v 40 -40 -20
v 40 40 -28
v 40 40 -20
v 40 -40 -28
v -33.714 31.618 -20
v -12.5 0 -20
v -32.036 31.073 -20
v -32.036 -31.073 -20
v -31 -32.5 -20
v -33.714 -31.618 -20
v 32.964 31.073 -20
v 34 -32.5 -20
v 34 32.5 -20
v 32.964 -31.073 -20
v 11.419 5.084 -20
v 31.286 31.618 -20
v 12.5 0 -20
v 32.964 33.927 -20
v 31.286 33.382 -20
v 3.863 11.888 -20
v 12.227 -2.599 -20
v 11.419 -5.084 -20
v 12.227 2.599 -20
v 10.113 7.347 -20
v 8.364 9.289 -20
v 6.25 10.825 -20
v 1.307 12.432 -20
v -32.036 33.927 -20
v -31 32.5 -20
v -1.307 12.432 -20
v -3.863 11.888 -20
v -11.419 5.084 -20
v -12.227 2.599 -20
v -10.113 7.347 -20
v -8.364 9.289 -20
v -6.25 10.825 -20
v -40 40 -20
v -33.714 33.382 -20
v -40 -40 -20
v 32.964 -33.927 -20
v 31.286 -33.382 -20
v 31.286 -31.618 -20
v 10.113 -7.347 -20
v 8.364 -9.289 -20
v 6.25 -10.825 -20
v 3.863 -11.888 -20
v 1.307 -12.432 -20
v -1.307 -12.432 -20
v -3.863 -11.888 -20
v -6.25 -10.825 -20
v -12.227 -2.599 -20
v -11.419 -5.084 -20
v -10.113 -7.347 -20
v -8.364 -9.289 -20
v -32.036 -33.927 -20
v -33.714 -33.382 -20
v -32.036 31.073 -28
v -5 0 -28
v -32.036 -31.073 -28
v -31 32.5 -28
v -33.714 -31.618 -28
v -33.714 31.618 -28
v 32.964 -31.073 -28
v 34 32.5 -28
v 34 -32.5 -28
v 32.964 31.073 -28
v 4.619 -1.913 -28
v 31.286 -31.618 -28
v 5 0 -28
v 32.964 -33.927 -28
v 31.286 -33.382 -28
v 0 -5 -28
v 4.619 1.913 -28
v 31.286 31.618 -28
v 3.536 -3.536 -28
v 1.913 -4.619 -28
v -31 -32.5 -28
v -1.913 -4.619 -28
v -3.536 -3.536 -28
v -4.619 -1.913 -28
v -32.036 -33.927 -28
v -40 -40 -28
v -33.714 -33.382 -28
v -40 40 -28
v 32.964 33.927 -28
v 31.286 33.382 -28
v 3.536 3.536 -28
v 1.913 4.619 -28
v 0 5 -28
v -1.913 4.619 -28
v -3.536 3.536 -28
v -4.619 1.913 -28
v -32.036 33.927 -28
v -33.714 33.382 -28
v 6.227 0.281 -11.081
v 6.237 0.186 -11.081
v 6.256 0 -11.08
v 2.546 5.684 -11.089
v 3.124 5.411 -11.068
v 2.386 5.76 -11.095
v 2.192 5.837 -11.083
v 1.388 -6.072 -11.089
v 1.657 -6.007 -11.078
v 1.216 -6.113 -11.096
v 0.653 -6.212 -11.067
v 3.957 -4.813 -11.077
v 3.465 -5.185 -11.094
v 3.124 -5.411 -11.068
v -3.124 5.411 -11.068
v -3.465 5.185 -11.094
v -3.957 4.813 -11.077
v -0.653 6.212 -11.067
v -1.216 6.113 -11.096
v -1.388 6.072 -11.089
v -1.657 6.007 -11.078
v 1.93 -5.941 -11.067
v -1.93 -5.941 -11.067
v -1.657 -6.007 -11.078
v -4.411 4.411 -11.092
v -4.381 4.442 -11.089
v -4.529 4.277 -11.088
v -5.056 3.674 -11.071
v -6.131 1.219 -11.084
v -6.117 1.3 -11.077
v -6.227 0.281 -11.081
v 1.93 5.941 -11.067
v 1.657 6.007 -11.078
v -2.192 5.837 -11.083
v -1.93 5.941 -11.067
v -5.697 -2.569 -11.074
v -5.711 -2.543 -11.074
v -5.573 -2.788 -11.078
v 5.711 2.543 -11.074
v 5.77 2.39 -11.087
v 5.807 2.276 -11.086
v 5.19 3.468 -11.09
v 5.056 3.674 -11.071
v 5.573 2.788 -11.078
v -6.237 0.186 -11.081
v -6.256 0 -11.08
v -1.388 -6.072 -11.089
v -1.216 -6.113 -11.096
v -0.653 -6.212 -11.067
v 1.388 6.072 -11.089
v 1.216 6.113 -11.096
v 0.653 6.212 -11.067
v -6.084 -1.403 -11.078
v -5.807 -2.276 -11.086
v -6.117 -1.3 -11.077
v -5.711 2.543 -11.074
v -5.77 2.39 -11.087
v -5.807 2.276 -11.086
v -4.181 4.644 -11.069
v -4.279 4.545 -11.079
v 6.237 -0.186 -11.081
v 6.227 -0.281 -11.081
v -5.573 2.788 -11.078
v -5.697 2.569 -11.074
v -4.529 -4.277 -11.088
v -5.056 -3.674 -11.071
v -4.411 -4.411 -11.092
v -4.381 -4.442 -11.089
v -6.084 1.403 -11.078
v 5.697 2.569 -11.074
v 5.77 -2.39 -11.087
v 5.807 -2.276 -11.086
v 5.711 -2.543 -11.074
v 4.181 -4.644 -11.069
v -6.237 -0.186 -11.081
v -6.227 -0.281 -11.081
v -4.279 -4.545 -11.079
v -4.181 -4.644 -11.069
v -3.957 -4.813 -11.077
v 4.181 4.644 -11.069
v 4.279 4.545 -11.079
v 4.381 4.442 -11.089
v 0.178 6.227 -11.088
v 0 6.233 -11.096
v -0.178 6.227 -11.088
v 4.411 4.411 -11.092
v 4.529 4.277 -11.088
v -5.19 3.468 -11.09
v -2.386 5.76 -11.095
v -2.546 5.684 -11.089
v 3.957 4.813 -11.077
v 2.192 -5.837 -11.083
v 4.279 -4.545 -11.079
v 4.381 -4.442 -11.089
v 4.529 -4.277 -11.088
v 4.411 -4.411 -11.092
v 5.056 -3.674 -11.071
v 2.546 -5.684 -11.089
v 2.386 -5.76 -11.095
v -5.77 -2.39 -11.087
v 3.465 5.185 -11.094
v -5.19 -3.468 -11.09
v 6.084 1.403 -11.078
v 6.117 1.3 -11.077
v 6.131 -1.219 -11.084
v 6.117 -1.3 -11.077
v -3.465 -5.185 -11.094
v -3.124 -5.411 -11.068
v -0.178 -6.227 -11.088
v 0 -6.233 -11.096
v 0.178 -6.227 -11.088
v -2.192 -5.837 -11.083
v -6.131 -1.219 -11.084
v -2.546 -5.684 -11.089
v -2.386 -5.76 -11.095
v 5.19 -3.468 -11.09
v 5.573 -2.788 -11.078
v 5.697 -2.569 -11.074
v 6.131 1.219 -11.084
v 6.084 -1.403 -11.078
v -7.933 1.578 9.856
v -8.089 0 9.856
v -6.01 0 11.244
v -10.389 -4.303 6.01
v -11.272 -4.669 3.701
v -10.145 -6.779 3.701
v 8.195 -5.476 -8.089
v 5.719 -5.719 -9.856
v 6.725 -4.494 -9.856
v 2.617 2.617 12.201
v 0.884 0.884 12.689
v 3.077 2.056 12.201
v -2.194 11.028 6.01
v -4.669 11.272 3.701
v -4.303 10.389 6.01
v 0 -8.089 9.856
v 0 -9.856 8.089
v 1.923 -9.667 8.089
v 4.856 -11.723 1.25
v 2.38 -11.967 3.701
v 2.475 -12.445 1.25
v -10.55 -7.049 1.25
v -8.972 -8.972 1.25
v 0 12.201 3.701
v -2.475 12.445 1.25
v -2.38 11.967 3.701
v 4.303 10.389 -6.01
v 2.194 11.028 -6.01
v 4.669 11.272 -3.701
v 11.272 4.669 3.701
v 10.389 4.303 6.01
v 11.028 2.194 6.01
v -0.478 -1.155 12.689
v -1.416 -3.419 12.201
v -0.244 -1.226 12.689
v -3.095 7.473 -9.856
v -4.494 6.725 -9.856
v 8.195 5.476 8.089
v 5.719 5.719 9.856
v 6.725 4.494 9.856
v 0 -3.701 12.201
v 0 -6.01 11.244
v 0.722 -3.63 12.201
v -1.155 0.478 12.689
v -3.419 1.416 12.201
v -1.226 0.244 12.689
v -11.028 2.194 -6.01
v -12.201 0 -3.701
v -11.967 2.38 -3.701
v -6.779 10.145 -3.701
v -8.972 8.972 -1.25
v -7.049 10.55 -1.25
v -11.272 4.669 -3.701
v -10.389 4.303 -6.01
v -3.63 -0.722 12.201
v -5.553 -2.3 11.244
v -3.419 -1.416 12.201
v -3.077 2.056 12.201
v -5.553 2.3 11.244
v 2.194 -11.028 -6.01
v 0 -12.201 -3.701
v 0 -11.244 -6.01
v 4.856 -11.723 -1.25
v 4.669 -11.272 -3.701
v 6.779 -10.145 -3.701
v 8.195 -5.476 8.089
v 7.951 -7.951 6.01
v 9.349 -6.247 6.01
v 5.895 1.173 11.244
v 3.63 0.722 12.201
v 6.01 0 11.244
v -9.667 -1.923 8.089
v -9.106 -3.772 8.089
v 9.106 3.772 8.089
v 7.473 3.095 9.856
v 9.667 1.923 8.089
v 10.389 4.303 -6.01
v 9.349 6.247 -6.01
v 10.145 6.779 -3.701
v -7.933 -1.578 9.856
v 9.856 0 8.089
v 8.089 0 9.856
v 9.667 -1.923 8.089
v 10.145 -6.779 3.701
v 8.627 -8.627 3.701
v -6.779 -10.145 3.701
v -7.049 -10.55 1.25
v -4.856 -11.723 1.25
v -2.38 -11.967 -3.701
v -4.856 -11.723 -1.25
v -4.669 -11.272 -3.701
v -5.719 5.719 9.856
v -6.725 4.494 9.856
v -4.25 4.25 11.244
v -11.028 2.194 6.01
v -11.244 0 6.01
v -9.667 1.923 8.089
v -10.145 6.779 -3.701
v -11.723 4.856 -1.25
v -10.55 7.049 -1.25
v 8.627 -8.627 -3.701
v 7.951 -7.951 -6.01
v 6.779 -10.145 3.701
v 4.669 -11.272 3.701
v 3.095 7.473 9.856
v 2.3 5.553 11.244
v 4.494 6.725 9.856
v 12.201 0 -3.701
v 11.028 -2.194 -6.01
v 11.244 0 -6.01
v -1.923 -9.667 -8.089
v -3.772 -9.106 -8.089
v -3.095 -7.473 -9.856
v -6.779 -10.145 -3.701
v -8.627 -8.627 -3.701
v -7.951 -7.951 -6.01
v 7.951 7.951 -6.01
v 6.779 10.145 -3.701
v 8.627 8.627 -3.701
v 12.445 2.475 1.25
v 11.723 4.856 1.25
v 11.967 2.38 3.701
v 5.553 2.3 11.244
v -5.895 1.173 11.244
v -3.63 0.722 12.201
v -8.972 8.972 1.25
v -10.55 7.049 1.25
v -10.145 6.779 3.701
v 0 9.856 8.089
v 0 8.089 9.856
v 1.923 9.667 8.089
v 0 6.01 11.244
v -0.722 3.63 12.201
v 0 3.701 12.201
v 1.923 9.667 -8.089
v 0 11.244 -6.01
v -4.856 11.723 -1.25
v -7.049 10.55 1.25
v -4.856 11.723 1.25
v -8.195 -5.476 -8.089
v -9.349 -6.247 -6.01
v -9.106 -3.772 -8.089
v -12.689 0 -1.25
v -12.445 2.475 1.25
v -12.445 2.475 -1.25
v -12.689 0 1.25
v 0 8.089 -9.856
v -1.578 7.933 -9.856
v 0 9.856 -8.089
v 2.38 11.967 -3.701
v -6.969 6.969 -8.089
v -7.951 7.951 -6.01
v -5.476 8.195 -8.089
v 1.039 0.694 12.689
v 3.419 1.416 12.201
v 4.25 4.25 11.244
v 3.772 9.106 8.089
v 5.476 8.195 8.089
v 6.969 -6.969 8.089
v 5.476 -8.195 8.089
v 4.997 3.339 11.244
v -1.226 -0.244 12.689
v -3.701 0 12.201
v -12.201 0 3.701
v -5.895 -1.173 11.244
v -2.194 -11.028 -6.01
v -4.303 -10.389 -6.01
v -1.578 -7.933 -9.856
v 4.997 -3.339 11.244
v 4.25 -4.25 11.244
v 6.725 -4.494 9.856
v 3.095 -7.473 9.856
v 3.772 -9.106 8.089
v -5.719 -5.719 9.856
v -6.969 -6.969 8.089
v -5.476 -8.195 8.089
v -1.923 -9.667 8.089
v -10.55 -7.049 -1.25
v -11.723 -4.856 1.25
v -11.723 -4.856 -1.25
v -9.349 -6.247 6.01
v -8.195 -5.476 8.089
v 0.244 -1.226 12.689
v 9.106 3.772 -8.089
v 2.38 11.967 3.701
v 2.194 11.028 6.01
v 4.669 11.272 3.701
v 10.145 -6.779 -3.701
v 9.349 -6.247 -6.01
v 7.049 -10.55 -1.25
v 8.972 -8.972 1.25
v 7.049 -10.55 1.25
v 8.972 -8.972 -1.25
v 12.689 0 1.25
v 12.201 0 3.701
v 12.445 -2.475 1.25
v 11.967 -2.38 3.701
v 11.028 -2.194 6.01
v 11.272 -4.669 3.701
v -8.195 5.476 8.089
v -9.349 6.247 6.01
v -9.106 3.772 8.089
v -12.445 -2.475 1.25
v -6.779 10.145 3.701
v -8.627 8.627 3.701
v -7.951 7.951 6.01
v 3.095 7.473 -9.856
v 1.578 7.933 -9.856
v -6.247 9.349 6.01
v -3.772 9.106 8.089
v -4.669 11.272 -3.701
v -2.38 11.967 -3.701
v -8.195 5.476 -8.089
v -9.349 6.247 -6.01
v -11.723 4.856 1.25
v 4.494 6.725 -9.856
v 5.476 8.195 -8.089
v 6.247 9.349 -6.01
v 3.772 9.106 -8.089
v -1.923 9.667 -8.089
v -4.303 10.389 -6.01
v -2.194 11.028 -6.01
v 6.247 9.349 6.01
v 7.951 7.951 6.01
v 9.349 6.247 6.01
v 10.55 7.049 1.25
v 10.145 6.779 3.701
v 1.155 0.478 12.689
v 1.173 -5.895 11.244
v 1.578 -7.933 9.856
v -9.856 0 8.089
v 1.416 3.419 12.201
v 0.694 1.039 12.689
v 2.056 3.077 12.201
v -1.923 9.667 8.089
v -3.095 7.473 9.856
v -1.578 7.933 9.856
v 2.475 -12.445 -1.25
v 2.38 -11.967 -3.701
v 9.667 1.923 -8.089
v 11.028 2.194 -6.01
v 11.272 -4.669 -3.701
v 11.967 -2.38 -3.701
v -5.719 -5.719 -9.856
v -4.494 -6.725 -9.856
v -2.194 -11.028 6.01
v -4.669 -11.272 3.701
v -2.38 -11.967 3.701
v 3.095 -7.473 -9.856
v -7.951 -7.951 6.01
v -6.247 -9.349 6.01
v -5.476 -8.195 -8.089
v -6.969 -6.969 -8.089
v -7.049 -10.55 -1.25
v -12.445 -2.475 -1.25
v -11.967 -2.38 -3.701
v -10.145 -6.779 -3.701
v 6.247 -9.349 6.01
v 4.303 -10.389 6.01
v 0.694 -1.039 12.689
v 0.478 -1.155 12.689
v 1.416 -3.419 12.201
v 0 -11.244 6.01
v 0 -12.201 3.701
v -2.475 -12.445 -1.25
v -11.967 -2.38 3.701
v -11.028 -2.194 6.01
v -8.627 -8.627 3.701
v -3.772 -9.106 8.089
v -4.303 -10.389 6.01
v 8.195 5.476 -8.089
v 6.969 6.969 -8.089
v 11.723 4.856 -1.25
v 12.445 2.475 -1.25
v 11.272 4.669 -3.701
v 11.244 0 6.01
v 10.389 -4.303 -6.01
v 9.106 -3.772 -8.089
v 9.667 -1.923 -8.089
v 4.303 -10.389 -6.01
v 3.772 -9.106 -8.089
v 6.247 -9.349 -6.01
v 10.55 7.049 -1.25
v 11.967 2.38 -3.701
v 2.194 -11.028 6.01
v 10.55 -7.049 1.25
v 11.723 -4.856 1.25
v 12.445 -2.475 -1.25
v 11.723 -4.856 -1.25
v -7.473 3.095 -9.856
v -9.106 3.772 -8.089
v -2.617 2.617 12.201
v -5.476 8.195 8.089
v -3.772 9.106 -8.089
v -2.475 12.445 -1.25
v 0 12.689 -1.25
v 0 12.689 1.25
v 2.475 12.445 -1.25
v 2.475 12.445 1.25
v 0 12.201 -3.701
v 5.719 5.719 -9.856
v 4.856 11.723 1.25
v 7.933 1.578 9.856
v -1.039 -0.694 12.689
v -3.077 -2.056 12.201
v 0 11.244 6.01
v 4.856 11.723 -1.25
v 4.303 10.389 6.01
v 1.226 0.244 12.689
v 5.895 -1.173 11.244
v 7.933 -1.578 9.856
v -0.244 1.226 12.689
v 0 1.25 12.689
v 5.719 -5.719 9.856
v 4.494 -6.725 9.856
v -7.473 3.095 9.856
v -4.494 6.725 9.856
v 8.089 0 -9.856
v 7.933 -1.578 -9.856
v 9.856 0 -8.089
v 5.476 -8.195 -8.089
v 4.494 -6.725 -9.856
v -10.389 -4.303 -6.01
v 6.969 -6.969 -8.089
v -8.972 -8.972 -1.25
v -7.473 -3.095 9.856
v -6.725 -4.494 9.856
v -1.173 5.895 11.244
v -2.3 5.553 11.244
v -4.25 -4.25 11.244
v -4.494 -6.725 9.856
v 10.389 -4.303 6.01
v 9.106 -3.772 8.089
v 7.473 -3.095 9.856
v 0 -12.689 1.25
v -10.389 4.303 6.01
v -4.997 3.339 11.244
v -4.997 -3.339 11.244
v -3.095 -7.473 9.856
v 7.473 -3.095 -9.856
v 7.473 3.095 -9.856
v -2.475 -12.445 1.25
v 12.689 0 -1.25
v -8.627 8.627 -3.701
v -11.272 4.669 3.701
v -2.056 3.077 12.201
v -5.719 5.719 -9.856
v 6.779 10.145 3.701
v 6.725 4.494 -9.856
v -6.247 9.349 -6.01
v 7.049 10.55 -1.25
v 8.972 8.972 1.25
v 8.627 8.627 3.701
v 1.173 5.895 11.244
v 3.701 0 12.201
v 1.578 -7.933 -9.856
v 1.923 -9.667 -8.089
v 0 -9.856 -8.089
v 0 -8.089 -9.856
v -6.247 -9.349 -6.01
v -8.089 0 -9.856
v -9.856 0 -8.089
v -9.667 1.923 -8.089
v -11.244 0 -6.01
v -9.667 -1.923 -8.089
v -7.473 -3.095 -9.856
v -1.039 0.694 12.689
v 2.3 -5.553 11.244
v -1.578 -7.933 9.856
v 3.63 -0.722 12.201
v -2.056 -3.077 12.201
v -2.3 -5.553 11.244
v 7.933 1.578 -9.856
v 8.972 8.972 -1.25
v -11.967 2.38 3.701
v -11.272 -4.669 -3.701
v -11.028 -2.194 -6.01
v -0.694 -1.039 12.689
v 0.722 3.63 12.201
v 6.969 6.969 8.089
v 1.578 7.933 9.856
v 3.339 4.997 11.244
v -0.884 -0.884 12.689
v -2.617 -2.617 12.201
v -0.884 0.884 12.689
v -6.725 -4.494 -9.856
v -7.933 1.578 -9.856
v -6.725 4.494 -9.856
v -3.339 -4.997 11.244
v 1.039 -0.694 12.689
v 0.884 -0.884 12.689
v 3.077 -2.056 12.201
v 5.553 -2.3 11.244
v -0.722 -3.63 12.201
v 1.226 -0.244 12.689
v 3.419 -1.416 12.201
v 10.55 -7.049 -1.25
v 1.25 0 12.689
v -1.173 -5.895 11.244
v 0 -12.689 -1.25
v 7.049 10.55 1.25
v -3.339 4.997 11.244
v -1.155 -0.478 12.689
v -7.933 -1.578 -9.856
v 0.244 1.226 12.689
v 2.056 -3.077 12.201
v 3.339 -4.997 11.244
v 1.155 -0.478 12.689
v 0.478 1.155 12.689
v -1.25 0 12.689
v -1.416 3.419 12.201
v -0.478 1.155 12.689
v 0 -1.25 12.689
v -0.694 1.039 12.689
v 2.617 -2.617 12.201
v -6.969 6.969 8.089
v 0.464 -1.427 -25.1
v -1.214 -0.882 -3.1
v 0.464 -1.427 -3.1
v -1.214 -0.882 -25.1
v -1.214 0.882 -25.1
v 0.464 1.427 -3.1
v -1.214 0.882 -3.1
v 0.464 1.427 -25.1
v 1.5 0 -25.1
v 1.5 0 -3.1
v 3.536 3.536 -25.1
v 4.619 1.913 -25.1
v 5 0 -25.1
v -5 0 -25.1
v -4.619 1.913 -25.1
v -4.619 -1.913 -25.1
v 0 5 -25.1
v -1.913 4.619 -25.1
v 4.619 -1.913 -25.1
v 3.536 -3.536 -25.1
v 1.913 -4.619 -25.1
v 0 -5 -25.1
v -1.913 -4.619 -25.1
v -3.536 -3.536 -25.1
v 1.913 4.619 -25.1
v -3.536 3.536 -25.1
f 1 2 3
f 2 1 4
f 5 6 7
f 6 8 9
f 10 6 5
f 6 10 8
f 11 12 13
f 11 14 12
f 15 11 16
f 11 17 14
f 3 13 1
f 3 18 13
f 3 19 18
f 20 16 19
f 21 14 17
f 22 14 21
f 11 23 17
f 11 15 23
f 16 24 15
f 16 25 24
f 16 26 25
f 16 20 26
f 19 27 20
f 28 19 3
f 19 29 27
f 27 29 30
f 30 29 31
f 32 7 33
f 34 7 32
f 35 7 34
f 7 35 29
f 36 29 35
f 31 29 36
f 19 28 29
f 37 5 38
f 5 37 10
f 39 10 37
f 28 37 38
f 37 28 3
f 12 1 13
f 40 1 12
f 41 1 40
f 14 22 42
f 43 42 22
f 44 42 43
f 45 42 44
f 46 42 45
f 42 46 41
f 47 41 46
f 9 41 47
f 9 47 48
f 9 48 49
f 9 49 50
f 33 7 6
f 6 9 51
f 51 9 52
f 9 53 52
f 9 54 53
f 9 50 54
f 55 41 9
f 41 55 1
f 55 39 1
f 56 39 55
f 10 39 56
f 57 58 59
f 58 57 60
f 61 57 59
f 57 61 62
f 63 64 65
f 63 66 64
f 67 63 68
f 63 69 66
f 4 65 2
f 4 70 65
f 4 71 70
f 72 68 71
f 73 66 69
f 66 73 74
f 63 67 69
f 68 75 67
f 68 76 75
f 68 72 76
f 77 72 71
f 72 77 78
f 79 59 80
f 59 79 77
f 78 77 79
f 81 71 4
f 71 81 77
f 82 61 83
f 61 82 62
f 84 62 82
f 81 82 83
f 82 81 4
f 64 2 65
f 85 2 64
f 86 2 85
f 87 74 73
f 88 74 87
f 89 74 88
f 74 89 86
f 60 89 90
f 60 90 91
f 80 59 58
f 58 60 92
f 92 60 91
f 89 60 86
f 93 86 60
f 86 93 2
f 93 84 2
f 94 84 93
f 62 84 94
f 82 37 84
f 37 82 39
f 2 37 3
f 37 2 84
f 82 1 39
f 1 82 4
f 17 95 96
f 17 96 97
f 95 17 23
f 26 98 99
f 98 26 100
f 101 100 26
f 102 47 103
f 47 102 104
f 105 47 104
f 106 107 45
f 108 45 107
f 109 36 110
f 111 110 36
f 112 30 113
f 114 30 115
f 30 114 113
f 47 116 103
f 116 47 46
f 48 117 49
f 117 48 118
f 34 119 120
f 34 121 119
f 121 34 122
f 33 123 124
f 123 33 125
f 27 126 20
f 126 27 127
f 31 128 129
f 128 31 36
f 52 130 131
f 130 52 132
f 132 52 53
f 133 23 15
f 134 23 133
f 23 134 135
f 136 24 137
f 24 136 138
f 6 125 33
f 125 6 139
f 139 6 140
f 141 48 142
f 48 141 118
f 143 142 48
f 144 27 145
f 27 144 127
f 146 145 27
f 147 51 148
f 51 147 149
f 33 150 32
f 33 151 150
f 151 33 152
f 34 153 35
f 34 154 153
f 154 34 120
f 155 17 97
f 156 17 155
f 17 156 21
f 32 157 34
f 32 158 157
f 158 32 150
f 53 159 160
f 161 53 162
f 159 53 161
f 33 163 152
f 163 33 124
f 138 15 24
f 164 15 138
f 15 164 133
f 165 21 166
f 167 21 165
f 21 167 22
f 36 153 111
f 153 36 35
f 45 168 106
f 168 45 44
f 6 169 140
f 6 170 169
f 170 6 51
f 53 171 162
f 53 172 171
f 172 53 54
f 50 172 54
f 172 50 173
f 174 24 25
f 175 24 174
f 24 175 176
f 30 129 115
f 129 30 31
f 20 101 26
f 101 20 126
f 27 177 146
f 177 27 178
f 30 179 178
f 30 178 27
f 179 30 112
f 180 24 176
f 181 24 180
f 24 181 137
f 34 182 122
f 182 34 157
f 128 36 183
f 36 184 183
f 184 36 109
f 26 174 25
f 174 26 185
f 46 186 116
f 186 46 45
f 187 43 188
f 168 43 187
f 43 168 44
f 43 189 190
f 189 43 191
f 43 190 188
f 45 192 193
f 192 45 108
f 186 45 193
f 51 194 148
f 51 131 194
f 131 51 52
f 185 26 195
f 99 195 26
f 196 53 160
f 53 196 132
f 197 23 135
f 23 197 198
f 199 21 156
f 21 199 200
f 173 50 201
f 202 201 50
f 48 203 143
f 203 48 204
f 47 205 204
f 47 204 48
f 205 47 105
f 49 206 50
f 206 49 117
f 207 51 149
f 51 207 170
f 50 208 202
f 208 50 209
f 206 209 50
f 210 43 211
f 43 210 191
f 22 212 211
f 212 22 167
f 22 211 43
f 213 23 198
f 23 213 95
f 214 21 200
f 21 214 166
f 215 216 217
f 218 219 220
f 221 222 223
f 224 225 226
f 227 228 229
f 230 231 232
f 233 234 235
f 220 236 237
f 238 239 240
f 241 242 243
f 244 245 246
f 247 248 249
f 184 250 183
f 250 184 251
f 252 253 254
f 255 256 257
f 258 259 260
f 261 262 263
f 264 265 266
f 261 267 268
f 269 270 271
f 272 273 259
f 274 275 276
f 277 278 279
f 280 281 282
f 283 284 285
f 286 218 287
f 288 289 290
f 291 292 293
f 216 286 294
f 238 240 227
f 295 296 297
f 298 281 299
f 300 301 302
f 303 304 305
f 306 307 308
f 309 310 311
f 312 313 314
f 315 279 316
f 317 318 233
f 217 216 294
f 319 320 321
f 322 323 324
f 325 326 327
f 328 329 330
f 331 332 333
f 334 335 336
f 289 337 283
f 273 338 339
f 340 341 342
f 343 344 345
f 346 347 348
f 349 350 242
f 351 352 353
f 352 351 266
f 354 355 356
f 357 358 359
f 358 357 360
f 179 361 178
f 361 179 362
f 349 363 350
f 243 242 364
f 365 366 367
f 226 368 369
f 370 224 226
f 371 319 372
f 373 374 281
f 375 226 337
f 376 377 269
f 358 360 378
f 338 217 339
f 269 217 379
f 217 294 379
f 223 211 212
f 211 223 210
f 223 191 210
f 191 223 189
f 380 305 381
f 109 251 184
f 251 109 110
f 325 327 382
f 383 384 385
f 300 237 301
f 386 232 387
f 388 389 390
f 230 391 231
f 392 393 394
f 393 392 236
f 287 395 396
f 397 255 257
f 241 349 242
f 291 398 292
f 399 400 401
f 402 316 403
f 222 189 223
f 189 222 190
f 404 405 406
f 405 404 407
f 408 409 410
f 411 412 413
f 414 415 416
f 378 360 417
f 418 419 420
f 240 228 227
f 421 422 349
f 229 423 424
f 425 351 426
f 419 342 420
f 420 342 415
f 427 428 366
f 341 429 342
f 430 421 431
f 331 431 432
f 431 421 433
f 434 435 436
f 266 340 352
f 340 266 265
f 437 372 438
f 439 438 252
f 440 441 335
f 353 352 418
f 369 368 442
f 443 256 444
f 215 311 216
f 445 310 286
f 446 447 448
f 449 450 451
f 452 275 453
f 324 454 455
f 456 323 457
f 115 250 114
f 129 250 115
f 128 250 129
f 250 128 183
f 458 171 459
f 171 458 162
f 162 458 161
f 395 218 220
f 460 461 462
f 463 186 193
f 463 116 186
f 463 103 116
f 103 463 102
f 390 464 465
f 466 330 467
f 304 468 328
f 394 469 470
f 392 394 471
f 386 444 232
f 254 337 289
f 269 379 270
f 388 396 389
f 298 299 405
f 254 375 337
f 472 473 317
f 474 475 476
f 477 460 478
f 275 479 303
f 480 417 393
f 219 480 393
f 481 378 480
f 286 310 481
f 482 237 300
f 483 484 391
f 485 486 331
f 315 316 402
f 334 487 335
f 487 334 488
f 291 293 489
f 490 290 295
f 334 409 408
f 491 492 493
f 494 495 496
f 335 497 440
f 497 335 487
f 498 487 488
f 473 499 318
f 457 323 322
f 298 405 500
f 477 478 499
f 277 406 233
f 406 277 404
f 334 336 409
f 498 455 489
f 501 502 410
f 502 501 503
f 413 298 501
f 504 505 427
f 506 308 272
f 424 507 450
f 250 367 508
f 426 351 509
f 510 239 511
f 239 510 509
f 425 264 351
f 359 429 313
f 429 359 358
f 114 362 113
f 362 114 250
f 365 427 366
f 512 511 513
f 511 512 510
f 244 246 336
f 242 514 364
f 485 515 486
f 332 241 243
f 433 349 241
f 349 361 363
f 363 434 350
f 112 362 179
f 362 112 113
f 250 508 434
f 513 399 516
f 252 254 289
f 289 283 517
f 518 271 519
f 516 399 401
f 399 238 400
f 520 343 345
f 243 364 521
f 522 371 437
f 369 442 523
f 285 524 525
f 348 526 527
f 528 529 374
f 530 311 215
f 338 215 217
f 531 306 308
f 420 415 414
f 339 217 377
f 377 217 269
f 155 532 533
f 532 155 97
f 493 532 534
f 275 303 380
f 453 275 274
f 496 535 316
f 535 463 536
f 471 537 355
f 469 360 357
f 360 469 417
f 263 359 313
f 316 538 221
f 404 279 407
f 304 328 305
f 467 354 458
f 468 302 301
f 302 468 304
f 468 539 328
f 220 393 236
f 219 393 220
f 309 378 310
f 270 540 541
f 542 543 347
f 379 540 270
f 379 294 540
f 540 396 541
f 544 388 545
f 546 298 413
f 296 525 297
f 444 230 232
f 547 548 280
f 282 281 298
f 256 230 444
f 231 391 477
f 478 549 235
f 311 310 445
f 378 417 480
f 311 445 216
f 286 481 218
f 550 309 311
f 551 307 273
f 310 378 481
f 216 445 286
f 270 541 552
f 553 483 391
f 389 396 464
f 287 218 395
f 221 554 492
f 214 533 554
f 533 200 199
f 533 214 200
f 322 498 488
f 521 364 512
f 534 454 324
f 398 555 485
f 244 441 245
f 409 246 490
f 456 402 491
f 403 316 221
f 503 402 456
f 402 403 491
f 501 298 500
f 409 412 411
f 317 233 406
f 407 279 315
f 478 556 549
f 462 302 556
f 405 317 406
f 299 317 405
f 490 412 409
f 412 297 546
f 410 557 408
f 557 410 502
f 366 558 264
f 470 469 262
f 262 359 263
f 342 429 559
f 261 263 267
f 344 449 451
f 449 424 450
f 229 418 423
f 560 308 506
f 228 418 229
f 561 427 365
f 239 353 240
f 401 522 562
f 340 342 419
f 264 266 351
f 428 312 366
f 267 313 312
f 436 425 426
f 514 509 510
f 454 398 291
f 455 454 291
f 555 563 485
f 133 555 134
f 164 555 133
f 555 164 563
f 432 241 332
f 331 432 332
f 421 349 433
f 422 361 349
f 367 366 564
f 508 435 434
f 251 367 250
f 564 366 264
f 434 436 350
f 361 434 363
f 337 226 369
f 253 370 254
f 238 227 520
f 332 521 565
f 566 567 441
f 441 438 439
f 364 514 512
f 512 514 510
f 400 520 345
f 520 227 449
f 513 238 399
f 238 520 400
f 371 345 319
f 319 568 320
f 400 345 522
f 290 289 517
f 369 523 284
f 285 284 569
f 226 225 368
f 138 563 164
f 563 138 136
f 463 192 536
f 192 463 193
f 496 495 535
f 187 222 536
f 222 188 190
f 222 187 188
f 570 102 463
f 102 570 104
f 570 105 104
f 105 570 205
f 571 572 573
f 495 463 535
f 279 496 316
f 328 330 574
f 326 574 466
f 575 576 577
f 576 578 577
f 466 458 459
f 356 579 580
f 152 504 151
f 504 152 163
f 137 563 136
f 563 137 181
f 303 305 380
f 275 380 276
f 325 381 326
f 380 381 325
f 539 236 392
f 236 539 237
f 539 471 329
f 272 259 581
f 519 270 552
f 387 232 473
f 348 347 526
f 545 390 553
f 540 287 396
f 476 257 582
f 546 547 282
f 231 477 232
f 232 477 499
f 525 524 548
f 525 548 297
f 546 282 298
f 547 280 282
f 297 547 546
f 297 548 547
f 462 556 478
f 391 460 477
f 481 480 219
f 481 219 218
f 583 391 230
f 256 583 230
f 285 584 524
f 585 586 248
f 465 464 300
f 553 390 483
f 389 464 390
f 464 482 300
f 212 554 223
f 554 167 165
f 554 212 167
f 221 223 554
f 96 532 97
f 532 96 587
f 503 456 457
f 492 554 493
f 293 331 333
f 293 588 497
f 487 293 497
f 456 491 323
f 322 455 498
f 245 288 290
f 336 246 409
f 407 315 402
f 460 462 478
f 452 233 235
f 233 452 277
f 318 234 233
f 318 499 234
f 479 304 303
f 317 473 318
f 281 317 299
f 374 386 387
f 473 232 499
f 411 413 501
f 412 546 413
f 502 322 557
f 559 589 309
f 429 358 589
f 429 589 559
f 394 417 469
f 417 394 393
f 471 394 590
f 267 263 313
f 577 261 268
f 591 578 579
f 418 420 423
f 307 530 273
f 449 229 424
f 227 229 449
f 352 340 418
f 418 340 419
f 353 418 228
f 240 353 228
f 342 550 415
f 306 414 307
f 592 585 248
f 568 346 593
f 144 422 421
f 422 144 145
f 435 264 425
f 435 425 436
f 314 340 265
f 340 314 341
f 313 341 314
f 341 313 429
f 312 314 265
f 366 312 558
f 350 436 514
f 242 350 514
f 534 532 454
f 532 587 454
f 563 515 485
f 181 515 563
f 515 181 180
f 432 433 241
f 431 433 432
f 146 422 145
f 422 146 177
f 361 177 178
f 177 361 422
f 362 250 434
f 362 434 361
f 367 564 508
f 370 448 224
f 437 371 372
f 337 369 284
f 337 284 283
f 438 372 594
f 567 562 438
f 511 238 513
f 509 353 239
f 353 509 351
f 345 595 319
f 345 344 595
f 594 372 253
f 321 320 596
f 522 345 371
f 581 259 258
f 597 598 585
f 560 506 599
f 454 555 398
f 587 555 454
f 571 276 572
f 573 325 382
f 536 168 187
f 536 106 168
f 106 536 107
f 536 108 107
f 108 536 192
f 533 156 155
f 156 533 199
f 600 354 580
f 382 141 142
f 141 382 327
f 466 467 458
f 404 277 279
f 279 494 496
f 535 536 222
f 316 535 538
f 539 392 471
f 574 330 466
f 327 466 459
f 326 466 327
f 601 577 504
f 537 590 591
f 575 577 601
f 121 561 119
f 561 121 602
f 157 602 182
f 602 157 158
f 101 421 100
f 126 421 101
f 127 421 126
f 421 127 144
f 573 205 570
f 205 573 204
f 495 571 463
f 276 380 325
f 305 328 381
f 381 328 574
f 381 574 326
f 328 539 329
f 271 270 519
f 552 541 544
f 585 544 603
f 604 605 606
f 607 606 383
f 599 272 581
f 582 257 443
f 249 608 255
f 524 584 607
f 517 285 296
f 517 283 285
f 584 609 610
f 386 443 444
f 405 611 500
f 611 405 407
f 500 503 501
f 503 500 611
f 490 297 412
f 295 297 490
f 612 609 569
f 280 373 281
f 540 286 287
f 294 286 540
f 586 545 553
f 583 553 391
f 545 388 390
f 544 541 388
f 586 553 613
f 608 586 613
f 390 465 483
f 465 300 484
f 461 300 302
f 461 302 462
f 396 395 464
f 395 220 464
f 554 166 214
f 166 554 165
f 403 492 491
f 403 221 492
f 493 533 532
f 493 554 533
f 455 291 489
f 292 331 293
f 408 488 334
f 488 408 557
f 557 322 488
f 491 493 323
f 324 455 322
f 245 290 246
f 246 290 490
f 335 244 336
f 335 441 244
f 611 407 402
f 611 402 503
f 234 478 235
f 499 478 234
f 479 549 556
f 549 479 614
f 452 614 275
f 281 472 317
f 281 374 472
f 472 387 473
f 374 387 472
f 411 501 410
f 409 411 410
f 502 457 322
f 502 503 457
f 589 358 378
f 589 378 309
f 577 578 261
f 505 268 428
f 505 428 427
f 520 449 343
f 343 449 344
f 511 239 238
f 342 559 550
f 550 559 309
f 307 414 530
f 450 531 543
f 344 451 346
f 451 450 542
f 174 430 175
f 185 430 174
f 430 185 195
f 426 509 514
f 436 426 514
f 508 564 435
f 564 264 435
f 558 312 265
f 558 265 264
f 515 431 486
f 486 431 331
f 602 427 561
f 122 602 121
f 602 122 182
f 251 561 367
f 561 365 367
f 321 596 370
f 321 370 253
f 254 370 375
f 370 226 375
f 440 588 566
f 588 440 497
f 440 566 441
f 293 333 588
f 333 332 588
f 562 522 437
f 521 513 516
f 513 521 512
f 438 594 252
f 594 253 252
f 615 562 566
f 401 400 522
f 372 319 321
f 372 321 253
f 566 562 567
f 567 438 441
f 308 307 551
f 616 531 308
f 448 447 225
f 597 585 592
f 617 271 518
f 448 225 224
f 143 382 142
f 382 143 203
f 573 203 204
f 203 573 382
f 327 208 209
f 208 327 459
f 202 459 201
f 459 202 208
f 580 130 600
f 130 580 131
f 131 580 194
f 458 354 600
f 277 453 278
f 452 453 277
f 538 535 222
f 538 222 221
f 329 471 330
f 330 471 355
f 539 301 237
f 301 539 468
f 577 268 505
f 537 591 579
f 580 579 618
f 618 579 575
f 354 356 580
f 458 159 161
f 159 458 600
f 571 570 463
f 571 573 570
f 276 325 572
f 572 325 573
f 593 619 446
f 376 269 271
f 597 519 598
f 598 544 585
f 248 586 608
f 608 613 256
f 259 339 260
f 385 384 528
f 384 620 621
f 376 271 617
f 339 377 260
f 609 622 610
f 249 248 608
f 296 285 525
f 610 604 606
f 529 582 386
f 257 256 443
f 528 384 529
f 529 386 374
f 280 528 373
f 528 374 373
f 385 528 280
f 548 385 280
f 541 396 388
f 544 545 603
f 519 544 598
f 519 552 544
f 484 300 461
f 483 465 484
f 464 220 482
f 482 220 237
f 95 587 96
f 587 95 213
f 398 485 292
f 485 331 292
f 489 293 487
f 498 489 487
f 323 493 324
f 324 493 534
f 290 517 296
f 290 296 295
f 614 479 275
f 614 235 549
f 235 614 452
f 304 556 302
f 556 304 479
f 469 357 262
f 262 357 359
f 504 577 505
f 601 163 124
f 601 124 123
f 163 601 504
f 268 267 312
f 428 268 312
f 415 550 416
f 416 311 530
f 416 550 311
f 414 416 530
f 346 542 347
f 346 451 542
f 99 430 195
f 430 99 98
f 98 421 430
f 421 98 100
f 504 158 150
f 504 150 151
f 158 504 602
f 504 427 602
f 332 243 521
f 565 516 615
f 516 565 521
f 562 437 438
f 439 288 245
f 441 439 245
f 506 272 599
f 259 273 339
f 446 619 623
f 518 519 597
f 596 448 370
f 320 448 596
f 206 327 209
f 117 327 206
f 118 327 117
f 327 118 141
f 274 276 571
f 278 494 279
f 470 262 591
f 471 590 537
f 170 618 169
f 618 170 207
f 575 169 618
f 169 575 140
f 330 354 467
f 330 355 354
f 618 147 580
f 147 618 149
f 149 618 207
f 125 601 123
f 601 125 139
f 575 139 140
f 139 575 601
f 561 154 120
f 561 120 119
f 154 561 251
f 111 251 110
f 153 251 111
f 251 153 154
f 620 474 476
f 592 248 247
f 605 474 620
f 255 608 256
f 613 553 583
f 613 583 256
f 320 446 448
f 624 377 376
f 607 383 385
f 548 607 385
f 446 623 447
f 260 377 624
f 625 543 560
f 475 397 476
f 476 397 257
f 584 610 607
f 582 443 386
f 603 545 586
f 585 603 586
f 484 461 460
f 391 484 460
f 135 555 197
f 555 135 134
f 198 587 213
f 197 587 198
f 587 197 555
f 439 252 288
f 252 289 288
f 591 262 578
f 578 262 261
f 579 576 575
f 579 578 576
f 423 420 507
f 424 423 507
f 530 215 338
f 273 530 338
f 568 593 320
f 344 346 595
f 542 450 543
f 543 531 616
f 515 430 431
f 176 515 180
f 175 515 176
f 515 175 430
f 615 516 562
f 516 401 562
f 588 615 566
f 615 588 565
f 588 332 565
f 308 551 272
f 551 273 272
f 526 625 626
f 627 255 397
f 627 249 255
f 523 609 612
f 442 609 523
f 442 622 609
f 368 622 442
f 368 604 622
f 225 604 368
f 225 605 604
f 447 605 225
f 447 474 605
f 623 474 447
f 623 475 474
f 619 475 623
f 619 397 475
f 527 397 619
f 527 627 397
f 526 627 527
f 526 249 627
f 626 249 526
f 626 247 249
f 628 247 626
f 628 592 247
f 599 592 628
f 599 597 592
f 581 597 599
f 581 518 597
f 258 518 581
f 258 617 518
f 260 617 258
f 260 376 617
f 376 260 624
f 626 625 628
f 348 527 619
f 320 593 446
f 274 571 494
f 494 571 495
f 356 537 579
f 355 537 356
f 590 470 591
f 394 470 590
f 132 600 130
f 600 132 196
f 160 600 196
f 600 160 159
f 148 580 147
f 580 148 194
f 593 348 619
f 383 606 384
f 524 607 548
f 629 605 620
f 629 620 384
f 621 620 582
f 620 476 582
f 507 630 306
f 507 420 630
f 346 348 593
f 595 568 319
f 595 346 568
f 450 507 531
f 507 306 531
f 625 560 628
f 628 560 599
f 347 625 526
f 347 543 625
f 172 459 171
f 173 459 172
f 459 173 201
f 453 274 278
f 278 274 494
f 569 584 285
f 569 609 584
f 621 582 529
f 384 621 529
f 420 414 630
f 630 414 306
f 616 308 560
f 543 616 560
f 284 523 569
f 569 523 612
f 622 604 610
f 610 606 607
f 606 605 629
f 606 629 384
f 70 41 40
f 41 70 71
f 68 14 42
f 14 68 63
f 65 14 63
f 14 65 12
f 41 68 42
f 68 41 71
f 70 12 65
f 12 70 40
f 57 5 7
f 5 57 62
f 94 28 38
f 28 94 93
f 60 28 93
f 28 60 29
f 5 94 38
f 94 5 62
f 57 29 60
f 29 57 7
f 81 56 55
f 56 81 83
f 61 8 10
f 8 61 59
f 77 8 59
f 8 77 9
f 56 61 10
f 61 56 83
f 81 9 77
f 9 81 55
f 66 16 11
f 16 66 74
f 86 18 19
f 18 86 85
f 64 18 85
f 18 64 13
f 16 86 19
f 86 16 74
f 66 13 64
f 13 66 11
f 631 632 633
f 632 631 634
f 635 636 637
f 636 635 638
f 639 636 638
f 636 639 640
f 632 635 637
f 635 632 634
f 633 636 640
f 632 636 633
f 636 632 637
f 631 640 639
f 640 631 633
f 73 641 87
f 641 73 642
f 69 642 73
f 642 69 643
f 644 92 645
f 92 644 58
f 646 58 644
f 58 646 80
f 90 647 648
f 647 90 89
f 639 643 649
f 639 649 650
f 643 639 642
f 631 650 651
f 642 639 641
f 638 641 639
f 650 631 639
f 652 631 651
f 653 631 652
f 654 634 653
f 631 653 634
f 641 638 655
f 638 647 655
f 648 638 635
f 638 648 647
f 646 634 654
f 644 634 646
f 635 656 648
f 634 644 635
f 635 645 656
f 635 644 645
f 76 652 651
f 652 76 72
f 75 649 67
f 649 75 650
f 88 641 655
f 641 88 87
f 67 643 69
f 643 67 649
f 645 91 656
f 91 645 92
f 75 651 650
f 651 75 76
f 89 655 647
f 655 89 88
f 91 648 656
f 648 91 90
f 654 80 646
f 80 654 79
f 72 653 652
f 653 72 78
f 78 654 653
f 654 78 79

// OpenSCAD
plate_thickness = 8;

difference() {
  union() {
    translate([0, 0, -20 - (plate_thickness / 2)]) {
      cube([80, 80, plate_thickness], center = true);
    }

    translate([0, 0, -20]) {
      cylinder(d1 = 25, d2 = 11, h = 10);
    }

    sphere(d = 25.5, $fn = 32);
  }

  translate([0, 0, -20 - plate_thickness - 0.1]) {
    cylinder(d = 3, h = 25, $fn = 5);
    cylinder(d = 10, h = 3, $fn = 16);

    for(p = [
      [32.5, -32.5],
      [-32.5, 32.5],
      [-32.5, -32.5],
      [32.5, 32.5],
    ]) {
      translate(p) {
        cylinder(d = 3, h = plate_thickness + 0.2, $fn = 5);
      }
    }
  }
}
